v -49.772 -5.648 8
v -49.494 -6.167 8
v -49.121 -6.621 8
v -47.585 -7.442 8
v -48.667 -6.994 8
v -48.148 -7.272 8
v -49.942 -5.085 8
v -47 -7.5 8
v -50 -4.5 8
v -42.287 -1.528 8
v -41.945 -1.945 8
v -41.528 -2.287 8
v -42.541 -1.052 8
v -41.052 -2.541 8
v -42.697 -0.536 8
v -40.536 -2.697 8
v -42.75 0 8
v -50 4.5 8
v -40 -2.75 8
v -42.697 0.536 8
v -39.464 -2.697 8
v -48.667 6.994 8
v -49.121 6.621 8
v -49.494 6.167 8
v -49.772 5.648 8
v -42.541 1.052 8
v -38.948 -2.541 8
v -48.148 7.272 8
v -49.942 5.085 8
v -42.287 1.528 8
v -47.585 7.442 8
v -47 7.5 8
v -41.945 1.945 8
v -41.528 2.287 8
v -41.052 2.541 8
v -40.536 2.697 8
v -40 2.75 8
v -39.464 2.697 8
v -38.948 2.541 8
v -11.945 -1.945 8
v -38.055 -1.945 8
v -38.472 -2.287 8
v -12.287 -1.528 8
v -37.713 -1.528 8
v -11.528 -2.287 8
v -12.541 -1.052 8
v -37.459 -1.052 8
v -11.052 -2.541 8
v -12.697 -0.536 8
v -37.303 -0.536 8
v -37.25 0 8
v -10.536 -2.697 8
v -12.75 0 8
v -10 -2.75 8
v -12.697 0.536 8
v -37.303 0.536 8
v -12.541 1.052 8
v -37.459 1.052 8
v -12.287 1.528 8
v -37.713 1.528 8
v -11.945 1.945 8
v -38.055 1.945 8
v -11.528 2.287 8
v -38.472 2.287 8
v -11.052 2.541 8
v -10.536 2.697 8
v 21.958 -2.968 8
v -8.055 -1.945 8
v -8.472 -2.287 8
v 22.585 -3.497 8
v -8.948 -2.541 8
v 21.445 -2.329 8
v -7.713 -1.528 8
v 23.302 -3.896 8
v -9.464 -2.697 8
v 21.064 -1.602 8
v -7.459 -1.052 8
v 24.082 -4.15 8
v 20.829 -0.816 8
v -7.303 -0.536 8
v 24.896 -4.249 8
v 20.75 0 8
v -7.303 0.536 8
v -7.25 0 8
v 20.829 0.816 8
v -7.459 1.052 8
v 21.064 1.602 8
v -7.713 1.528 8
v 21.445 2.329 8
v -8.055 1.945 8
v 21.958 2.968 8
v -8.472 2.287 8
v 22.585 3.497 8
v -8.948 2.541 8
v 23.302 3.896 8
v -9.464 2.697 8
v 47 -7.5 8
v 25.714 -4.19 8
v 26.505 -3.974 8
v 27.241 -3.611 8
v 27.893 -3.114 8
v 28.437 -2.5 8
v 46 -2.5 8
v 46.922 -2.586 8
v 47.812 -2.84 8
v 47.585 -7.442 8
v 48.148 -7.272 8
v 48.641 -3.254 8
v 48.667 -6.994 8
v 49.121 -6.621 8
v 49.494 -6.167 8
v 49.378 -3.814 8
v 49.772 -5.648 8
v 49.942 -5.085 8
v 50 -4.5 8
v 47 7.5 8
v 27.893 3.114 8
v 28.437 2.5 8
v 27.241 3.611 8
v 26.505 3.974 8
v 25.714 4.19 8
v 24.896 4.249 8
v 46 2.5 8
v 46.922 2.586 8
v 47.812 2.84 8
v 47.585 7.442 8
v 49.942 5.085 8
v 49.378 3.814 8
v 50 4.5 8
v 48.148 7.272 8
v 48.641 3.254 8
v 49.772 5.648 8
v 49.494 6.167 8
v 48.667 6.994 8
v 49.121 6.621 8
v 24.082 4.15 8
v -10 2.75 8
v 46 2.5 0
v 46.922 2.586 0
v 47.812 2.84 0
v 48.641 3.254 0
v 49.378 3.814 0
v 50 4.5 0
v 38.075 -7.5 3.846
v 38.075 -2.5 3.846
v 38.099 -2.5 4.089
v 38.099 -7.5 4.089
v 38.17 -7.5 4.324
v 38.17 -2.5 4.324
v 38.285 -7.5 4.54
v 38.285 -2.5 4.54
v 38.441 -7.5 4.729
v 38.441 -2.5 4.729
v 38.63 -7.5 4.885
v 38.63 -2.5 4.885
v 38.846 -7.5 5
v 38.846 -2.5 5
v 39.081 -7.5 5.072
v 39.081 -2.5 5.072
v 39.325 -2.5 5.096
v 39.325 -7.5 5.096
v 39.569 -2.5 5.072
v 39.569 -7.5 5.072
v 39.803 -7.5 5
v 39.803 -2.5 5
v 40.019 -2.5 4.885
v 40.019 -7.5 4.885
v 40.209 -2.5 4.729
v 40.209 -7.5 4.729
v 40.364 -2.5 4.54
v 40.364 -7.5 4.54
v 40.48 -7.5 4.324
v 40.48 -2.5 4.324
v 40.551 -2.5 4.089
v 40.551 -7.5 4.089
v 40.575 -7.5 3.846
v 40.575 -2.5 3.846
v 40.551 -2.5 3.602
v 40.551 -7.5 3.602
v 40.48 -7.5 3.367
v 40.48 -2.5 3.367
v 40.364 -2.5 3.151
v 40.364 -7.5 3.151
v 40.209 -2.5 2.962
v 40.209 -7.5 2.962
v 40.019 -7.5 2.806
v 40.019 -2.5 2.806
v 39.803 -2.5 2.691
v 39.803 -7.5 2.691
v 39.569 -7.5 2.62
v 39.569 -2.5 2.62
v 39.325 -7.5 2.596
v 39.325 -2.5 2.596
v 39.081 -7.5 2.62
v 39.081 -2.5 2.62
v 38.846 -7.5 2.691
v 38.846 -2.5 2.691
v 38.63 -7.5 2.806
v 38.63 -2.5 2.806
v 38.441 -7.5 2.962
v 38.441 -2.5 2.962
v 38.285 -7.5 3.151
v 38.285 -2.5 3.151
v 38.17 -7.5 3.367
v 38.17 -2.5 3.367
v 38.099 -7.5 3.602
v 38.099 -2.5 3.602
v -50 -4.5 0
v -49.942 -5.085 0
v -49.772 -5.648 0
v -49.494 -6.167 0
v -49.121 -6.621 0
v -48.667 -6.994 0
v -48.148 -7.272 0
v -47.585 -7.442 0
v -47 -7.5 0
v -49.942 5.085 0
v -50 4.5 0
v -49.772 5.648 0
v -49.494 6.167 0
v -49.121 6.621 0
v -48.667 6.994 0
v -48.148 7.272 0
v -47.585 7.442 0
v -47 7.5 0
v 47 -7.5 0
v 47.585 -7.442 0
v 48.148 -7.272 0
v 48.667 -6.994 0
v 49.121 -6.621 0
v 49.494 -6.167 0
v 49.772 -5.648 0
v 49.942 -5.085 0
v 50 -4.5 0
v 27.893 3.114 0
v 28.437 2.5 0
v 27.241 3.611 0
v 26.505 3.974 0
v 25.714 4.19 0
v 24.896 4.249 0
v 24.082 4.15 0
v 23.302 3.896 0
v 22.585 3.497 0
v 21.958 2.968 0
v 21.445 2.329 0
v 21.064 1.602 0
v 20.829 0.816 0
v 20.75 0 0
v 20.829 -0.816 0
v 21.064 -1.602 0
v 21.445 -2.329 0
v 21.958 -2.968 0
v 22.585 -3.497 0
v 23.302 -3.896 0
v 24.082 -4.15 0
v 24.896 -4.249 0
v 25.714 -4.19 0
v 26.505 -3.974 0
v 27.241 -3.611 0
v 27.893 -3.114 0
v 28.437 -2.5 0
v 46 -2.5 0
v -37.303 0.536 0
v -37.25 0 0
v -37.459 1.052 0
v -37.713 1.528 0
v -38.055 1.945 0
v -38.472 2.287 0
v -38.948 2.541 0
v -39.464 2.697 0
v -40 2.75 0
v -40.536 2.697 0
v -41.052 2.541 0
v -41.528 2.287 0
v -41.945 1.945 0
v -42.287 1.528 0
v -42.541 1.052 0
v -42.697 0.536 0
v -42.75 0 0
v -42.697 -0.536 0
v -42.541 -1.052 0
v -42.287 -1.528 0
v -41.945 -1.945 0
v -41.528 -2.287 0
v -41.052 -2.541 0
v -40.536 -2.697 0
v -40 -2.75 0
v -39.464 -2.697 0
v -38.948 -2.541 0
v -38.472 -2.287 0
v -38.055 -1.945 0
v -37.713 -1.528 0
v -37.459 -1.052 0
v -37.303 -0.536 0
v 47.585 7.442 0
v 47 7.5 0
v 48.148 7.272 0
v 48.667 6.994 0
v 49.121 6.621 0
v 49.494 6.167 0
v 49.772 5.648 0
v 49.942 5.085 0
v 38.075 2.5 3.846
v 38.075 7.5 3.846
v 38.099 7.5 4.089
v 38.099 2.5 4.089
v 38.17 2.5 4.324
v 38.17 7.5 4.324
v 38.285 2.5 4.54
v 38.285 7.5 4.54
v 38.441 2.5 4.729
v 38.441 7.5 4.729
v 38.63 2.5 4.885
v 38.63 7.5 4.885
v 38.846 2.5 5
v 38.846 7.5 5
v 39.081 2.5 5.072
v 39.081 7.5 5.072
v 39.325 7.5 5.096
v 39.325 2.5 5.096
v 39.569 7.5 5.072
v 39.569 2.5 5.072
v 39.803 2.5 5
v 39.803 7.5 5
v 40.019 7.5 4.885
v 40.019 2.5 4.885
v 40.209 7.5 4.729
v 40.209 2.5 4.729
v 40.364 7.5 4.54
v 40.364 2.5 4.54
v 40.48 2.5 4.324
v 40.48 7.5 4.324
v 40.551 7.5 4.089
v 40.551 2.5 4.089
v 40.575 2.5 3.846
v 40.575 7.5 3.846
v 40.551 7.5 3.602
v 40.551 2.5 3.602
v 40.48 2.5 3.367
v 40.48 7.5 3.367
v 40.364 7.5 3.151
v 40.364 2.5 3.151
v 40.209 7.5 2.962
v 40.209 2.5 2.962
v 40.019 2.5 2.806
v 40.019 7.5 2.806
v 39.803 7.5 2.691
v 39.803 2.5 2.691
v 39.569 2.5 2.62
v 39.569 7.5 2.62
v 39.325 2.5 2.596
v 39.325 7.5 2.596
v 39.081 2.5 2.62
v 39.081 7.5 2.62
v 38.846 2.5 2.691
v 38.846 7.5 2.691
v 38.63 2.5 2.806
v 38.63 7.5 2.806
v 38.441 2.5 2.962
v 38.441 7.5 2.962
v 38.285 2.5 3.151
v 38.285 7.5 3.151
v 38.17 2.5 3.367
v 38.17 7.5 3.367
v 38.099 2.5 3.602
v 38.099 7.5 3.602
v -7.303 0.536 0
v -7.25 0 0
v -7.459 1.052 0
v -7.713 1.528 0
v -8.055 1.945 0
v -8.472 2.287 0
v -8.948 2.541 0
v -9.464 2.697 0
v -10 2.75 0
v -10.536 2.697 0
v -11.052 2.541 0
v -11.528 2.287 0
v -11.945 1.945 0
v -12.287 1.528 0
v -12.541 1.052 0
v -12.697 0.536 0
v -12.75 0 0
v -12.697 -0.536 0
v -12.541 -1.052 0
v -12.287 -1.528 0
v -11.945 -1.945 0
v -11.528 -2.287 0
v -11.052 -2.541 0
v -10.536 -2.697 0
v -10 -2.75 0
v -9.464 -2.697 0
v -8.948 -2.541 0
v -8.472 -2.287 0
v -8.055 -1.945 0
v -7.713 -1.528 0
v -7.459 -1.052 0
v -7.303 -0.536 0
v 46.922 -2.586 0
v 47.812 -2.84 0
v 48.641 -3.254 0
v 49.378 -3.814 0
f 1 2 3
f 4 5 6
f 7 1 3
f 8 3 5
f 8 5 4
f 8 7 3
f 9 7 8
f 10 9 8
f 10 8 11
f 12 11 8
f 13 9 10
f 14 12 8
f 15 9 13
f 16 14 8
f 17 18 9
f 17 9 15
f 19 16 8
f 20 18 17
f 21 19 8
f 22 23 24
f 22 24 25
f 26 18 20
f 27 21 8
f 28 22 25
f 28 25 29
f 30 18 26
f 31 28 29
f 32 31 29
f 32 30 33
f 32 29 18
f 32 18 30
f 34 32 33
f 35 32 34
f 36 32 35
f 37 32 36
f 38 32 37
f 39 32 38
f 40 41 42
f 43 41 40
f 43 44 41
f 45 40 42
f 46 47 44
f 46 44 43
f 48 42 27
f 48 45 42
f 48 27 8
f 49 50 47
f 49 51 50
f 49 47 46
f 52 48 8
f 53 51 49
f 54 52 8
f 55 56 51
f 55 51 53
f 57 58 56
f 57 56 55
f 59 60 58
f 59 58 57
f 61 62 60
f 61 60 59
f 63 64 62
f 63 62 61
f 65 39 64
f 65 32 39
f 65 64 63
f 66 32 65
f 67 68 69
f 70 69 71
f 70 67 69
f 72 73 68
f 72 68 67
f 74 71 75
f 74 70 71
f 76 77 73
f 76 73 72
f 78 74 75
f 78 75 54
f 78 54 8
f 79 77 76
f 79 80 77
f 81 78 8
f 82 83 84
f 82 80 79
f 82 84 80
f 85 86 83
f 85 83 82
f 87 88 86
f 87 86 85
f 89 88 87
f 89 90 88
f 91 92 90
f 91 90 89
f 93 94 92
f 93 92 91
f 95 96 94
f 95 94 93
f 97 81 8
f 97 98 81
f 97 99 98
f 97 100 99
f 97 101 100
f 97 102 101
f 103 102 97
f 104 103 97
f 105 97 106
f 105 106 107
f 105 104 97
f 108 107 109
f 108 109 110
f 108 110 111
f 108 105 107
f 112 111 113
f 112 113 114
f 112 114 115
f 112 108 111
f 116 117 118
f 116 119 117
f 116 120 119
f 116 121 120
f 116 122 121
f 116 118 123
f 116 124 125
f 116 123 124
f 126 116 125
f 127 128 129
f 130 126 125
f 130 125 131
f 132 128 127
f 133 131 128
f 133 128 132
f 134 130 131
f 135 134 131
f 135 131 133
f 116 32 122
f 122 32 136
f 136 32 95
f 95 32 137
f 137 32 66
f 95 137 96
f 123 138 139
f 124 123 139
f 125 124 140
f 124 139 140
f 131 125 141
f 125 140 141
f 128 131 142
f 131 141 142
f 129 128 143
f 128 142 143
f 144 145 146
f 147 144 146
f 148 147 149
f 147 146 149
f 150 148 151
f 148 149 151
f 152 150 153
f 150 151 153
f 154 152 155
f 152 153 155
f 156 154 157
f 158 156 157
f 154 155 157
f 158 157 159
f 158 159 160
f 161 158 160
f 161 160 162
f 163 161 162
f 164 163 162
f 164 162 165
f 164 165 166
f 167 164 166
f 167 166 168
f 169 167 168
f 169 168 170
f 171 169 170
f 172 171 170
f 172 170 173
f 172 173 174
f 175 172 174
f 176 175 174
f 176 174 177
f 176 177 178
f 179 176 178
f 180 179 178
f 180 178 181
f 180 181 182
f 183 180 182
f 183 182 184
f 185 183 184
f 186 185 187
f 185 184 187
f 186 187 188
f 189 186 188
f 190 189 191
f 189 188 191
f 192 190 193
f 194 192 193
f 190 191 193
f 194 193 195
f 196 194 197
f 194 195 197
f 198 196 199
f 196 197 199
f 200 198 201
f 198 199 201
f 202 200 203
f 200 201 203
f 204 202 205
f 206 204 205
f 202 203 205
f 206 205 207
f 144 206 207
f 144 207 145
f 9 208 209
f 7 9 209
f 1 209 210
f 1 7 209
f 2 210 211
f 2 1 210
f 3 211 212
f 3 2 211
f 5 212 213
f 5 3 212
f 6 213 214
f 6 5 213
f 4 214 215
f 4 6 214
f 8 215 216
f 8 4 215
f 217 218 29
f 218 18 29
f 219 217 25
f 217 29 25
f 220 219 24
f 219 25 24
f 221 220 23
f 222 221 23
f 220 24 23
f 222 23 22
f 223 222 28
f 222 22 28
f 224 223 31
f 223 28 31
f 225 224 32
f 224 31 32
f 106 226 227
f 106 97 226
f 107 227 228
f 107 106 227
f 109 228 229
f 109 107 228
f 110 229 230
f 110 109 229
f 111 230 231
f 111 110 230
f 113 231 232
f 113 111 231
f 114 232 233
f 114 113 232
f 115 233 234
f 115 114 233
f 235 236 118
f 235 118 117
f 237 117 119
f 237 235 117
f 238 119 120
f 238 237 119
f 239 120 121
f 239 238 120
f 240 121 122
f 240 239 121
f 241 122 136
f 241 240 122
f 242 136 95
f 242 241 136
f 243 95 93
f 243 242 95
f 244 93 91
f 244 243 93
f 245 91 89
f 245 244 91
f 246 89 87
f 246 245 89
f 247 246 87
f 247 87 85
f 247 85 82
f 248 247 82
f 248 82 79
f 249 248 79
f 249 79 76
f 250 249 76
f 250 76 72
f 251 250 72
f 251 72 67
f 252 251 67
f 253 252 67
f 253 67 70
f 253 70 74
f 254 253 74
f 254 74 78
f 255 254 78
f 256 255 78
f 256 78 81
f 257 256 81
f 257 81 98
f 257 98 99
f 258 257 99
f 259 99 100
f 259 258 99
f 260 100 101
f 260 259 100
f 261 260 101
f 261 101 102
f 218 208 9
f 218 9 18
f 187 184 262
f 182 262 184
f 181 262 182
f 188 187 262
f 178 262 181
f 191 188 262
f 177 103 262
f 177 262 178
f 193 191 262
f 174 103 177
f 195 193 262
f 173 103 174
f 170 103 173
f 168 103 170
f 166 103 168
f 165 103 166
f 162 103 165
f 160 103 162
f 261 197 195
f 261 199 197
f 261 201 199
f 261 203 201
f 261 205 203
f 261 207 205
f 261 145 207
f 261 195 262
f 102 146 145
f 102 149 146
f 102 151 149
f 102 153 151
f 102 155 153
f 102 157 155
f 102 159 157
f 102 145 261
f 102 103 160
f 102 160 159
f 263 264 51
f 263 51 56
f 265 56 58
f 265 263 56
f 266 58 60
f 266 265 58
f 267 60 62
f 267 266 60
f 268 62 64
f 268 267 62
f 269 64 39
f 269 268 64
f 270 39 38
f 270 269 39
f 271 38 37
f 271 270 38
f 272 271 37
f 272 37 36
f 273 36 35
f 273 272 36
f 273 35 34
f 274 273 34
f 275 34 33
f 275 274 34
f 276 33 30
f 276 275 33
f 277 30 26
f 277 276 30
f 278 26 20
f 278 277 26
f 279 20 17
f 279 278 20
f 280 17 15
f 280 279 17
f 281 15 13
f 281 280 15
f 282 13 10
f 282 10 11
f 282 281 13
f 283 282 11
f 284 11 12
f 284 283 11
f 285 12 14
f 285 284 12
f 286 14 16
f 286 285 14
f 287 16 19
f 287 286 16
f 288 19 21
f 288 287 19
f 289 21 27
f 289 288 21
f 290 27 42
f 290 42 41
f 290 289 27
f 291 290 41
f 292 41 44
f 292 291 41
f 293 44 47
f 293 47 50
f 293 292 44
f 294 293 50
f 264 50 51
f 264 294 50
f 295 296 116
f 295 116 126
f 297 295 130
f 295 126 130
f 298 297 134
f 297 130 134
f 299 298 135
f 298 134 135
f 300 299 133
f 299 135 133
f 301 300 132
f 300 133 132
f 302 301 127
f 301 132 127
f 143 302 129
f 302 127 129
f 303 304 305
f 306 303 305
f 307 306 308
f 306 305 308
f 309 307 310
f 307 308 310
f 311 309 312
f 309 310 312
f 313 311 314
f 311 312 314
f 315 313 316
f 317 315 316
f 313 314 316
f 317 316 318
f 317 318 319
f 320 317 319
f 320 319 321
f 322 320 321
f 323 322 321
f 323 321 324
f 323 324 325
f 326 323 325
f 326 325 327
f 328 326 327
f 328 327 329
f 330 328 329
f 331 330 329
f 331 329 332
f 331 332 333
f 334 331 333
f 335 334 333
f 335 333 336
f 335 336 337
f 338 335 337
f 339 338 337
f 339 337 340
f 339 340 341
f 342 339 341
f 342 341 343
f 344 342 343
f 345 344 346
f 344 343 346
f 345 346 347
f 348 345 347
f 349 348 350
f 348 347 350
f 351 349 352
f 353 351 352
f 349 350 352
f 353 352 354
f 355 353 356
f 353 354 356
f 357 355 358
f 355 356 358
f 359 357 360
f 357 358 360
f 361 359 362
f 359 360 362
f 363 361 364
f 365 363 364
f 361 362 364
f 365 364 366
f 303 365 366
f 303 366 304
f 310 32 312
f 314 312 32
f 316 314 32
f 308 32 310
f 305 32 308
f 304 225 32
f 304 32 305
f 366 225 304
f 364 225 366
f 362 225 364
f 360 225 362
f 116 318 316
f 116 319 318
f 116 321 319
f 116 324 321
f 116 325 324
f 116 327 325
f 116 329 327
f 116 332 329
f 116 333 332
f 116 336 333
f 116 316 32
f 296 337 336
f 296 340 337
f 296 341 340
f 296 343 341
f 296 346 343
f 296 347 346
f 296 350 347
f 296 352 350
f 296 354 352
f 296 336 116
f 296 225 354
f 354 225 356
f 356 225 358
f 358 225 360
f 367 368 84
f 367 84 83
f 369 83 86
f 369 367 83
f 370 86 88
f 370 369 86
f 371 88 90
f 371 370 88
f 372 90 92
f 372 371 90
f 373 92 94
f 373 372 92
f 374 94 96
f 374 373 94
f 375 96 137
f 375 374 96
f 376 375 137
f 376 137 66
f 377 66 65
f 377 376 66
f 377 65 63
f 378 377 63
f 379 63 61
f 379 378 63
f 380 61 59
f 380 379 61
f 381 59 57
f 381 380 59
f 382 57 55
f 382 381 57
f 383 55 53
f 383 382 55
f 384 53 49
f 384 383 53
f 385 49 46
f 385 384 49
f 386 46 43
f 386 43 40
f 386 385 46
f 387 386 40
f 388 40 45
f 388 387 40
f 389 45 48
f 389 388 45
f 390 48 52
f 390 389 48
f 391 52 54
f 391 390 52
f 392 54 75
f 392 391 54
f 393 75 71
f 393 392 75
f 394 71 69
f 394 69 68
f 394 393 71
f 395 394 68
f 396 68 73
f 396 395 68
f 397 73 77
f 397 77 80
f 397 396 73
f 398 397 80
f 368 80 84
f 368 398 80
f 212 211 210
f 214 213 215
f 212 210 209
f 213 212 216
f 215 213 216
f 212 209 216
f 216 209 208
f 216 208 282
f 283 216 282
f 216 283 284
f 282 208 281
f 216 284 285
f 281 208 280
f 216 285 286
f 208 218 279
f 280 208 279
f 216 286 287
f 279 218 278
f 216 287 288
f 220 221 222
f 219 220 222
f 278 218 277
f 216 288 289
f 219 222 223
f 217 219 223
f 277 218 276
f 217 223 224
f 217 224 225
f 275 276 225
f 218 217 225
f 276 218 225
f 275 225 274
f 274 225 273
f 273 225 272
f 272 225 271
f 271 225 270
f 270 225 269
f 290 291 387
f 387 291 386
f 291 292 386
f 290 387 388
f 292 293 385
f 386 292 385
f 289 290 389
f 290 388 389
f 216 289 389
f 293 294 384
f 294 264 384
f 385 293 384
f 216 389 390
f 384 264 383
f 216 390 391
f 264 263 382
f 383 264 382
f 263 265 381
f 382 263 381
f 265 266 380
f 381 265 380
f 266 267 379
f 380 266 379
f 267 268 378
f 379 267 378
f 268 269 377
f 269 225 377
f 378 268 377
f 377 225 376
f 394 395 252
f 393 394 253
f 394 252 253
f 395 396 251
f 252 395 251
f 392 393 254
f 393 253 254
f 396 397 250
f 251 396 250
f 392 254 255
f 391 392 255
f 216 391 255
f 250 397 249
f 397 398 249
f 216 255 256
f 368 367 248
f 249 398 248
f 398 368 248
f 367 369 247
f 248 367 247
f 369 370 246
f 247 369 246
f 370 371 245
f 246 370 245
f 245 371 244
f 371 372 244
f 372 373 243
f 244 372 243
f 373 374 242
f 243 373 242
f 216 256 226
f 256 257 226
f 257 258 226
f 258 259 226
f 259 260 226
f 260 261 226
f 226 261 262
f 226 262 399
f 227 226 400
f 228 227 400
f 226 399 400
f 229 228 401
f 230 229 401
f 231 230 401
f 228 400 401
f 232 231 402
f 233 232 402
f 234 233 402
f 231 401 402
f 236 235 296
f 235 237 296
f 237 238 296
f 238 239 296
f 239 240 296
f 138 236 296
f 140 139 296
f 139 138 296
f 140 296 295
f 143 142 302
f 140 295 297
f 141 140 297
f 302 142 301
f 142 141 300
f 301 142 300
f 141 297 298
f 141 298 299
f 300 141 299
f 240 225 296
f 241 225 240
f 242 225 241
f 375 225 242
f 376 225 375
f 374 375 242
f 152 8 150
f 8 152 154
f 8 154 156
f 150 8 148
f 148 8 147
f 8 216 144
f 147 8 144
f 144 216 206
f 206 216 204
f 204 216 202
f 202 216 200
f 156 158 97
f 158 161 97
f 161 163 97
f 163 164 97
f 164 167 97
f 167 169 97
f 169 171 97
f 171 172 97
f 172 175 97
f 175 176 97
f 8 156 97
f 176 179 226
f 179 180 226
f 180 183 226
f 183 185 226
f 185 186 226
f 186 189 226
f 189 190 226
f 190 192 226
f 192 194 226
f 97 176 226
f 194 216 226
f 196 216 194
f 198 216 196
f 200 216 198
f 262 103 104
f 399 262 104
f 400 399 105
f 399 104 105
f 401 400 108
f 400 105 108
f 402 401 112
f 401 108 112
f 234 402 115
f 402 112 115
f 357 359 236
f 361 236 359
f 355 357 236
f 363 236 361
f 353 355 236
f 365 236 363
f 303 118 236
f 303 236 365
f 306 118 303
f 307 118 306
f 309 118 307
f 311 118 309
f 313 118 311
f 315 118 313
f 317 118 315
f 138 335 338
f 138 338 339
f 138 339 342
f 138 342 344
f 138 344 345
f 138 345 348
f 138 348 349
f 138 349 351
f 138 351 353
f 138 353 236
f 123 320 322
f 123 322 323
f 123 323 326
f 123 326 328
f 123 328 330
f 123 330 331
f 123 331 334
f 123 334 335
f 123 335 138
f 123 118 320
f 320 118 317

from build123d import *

# Parameters (mm, degrees)
SKIZZE1_W                       = 100
SKIZZE1_H                       = 15
SKIZZE1_R                       = 2.75
SKIZZE1_R_2                     = 4.25
AUFSATZ_LINEAR_AUSTRAGEN1_DEPTH = 8
VERRUNDUNG1_R                   = 3
SCHNITT_LINEAR_AUSTRAGEN1_DEPTH = 30
M3_GEWINDEBOHRUNG1_D            = 2.5
VERRUNDUNG2_R                   = 5


with BuildPart() as part:
    # Skizze1 → Aufsatz-Linear austragen1 (new body)
    with BuildSketch(Plane.XY):
        Rectangle(SKIZZE1_W, SKIZZE1_H)
        with Locations((-10, 0)):
            Circle(SKIZZE1_R, mode=Mode.SUBTRACT)
        with Locations((-40, 0)):
            Circle(SKIZZE1_R, mode=Mode.SUBTRACT)
        with Locations((25, 0)):
            Circle(SKIZZE1_R_2, mode=Mode.SUBTRACT)
    extrude(amount=AUFSATZ_LINEAR_AUSTRAGEN1_DEPTH)

    # Verrundung1
    verrundung1_edges = [part.edges().sort_by_distance(p)[0] for p in [
        (-50, 7.5, 4),
        (50, 7.5, 4),
        (50, -7.5, 4),
        (-50, -7.5, 4),
    ]]
    fillet(verrundung1_edges, radius=VERRUNDUNG1_R)

    # Skizze2 → Schnitt-Linear austragen1 (cut)
    with BuildSketch(Plane.XY.offset(8)):
        with BuildLine():
            Line((25, 2.5), (52.731650319, 2.5))
            ThreePointArc((52.731650319, 2.5), (55.231650319, 0), (52.731650319, -2.5))
            Line((52.731650319, -2.5), (25, -2.5))
            ThreePointArc((25, -2.5), (22.5, 0), (25, 2.5))
        make_face()
    extrude(amount=-SCHNITT_LINEAR_AUSTRAGEN1_DEPTH, mode=Mode.SUBTRACT)

    # M3 Gewindebohrung1 (through all)
    with Locations(Plane.XZ.offset(7.5)):
        with Locations((39.324789102, 3.845615986)):
            Hole(M3_GEWINDEBOHRUNG1_D / 2)

    # Verrundung2
    # the kernel refuses this fillet: 5 mm, written as the material it takes off along each edge
    with BuildSketch(Plane(origin=(50, -2.5, 18), x_dir=(-1, 0, 0), z_dir=(0, 0, -1))) as verrundung2_piece_1:
        with BuildLine():
            CenterArc((4, -5), VERRUNDUNG2_R, 90, 53.130102354)
            Line((0, -2), (-0.08, -1.94))
            ThreePointArc((-0.08, -1.94), (-0.1, -1), (-0.1, 0))
            Line((-0.1, 0), (0, 0.1))
            Line((0, 0.1), (4, 0.1))
            Line((4, 0.1), (4, 0))
        make_face()
    extrude(amount=28, mode=Mode.SUBTRACT)
    with BuildSketch(Plane(origin=(50, 2.5, -10), x_dir=(0, 1, 0), z_dir=(0, 0, 1))) as verrundung2_piece_2:
        with BuildLine():
            CenterArc((5, 4), VERRUNDUNG2_R, 180, 53.130102354)
            Line((0, 4), (-0.1, 4))
            Line((-0.1, 4), (-0.1, 0))
            Line((-0.1, 0), (0, -0.1))
            ThreePointArc((0, -0.1), (1, -0.1), (1.94, -0.08))
            Line((1.94, -0.08), (2, 0))
        make_face()
    extrude(amount=28, mode=Mode.SUBTRACT)


solid = part.part
